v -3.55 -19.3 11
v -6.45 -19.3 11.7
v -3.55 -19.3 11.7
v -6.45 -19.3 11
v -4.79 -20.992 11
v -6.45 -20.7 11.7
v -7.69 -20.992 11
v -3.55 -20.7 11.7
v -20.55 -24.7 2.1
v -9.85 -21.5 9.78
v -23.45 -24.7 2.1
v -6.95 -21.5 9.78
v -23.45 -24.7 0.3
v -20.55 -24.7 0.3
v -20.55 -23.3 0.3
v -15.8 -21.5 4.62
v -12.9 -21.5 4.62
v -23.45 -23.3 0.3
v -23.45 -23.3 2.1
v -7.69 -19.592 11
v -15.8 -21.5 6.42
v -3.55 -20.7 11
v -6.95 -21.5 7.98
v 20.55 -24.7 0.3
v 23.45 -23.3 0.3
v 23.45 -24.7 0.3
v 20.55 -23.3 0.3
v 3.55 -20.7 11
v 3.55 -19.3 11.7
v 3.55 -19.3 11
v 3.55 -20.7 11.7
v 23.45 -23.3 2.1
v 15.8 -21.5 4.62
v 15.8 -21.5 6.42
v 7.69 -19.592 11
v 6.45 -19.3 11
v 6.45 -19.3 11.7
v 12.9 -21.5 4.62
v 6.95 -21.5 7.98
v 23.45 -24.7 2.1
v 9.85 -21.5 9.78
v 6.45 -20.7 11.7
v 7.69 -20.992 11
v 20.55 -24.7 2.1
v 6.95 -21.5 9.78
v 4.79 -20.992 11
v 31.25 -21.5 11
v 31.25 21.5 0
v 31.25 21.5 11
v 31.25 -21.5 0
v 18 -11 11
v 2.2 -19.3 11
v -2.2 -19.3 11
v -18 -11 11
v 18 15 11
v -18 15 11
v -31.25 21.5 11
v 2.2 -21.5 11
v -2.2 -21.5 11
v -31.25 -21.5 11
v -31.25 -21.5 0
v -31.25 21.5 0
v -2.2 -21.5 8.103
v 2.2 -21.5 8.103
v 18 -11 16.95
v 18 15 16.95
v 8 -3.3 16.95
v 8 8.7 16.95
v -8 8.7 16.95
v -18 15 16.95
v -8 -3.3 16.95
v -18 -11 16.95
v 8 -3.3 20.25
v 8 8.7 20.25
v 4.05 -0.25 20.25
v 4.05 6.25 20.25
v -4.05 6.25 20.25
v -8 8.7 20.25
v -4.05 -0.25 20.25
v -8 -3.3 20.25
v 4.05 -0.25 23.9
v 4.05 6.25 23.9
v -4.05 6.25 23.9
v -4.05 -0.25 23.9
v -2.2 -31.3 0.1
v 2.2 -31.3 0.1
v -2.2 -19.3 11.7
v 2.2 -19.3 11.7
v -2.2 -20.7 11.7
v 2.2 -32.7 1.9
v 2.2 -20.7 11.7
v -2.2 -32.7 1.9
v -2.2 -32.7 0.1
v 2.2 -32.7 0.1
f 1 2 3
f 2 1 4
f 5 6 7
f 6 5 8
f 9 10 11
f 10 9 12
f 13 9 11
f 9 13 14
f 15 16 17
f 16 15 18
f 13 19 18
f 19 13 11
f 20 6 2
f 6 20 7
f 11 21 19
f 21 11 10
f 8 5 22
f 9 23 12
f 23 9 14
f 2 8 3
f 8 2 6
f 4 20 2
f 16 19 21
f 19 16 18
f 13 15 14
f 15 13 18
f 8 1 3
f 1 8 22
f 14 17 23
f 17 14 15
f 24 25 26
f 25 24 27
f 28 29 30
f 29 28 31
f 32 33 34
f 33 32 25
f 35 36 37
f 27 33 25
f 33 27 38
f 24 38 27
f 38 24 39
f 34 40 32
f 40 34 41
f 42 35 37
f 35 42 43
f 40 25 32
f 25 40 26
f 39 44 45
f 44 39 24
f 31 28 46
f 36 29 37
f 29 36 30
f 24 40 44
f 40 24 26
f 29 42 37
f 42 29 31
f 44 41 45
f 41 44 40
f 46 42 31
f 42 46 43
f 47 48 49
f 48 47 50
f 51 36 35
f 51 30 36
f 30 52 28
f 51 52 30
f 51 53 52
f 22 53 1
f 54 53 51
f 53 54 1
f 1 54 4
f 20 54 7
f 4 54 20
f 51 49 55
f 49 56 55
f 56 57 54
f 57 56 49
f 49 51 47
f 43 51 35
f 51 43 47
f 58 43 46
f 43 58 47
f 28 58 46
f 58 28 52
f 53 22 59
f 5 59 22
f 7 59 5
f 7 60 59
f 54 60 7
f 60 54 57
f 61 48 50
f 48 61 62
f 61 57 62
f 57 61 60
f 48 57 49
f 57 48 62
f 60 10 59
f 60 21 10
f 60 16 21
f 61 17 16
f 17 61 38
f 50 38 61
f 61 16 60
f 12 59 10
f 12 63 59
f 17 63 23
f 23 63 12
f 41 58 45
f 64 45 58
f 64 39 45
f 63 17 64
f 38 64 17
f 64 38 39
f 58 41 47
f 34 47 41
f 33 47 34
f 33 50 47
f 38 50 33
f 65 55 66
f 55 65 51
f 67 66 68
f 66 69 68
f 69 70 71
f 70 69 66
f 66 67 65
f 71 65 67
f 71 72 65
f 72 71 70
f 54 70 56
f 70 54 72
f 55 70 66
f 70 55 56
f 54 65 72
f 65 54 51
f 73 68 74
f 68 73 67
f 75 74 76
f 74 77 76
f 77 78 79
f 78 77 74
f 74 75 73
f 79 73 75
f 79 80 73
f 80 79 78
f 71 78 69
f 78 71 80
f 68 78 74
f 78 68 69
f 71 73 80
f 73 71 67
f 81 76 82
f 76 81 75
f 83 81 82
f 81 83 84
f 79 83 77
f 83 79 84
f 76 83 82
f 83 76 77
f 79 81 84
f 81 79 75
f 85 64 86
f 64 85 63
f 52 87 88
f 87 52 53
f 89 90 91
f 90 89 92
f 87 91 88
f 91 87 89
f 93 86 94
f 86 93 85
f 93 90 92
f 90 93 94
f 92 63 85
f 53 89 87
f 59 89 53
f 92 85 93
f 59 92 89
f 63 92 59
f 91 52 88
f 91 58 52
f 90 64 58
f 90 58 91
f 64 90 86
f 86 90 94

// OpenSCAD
// Independent, simplified parametric check model for tooling tests.
// NOT the original Ur monument, NOT the CC BY History Builds mesh.
// The staged geometry borrows published approximate terrace dimensions.
module stepped_ur() {
    union() {
        translate([0,0,5.5]) cube([62.5,43,11],center=true);
        translate([0,2,13.8]) cube([36,26,6.3],center=true);
        translate([0,2.7,18.35]) cube([16,12,3.8],center=true);
        translate([0,3,21.8]) cube([8.1,6.5,4.2],center=true);
        // Axial approach, intentionally simplified and not survey-grade.
        hull() {
            translate([0,-32,1]) cube([4.4,1.4,1.8],center=true);
            translate([0,-20,10.8]) cube([4.4,1.4,1.8],center=true);
        }
        // The paired approaches approximate the historical tripartite relation.
        for (side=[-1,1]) hull() {
            translate([side*22,-24,1.2]) cube([2.9,1.4,1.8],center=true);
            translate([side*5,-20,10.8]) cube([2.9,1.4,1.8],center=true);
        }
    }
}
stepped_ur();
